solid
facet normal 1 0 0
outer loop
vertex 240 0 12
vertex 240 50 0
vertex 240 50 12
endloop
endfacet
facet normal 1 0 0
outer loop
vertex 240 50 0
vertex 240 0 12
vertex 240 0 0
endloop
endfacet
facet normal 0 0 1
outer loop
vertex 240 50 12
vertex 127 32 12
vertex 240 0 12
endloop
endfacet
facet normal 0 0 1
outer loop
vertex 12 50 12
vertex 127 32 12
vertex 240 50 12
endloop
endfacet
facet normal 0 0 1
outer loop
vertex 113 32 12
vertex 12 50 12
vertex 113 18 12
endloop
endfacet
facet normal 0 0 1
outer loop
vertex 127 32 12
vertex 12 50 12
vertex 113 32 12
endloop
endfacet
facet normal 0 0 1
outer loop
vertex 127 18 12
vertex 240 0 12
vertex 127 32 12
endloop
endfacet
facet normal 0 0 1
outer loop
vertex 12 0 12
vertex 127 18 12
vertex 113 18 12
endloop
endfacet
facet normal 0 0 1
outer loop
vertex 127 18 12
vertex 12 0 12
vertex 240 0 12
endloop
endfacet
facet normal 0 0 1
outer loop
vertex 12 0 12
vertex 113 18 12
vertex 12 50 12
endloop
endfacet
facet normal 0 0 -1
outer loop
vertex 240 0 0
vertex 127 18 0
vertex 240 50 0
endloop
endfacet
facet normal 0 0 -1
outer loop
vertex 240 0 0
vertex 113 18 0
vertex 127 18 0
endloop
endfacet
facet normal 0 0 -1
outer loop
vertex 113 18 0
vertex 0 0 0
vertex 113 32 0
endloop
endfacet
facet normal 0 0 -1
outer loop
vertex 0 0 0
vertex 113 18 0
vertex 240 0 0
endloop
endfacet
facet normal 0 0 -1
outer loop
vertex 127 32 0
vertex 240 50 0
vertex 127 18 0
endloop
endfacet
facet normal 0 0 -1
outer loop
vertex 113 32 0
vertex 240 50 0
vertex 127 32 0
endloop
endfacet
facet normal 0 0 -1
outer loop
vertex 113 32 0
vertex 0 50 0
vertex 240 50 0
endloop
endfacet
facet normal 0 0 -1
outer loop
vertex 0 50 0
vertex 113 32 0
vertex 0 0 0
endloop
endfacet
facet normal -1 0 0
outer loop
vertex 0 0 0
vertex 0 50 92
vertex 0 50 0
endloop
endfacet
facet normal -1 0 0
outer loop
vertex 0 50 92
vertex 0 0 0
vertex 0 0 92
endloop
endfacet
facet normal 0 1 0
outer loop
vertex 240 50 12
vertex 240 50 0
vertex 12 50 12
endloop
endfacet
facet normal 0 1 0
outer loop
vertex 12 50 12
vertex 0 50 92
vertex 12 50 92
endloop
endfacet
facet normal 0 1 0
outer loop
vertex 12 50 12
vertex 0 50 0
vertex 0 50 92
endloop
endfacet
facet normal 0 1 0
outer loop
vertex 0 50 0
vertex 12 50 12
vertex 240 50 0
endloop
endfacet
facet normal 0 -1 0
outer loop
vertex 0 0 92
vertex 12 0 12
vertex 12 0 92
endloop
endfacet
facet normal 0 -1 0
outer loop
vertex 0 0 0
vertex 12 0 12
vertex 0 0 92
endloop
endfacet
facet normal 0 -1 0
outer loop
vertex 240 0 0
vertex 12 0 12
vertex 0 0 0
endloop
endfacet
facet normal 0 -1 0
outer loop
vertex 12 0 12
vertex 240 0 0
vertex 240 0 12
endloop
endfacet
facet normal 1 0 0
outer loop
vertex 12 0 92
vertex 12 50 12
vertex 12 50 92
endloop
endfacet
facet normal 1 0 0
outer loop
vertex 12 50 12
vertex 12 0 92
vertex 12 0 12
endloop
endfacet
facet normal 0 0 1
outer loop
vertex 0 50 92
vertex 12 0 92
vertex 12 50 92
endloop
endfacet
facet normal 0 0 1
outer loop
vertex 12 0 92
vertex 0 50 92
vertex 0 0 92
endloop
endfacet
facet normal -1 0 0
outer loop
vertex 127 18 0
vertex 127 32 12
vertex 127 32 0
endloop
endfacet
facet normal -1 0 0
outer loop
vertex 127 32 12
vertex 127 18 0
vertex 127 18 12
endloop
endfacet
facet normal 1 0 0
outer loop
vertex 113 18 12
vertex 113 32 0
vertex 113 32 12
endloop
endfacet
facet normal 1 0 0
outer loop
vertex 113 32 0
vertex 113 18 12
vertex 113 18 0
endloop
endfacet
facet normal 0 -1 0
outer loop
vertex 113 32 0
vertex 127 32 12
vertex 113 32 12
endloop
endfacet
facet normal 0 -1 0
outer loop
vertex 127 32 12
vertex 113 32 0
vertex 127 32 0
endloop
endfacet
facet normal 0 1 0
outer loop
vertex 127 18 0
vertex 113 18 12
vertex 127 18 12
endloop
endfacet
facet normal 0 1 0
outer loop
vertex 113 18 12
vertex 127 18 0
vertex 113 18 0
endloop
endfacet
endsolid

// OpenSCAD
$fn = 32;

// ----------------------------------------------------------------------
// Gantry bracket: 200-250 mm L bracket
// ----------------------------------------------------------------------

// --- parameters (mm) ---
base_l = 240;             // base arm length, X
arm_w = 50;               // arm width, Y
thick = 12;               // arm thickness
up_h = 80;                // vertical arm height, Z
slot_w = 14;              // adjustment slot width in the base

total_h = up_h + thick;  // overall height

difference() {
  union() {
    cube([base_l, arm_w, thick]);
    cube([thick, arm_w, total_h]);
  }
  translate([base_l / 2 - slot_w / 2, arm_w / 2 - slot_w / 2, -1])
    cube([slot_w, slot_w, thick + 2]);
}
